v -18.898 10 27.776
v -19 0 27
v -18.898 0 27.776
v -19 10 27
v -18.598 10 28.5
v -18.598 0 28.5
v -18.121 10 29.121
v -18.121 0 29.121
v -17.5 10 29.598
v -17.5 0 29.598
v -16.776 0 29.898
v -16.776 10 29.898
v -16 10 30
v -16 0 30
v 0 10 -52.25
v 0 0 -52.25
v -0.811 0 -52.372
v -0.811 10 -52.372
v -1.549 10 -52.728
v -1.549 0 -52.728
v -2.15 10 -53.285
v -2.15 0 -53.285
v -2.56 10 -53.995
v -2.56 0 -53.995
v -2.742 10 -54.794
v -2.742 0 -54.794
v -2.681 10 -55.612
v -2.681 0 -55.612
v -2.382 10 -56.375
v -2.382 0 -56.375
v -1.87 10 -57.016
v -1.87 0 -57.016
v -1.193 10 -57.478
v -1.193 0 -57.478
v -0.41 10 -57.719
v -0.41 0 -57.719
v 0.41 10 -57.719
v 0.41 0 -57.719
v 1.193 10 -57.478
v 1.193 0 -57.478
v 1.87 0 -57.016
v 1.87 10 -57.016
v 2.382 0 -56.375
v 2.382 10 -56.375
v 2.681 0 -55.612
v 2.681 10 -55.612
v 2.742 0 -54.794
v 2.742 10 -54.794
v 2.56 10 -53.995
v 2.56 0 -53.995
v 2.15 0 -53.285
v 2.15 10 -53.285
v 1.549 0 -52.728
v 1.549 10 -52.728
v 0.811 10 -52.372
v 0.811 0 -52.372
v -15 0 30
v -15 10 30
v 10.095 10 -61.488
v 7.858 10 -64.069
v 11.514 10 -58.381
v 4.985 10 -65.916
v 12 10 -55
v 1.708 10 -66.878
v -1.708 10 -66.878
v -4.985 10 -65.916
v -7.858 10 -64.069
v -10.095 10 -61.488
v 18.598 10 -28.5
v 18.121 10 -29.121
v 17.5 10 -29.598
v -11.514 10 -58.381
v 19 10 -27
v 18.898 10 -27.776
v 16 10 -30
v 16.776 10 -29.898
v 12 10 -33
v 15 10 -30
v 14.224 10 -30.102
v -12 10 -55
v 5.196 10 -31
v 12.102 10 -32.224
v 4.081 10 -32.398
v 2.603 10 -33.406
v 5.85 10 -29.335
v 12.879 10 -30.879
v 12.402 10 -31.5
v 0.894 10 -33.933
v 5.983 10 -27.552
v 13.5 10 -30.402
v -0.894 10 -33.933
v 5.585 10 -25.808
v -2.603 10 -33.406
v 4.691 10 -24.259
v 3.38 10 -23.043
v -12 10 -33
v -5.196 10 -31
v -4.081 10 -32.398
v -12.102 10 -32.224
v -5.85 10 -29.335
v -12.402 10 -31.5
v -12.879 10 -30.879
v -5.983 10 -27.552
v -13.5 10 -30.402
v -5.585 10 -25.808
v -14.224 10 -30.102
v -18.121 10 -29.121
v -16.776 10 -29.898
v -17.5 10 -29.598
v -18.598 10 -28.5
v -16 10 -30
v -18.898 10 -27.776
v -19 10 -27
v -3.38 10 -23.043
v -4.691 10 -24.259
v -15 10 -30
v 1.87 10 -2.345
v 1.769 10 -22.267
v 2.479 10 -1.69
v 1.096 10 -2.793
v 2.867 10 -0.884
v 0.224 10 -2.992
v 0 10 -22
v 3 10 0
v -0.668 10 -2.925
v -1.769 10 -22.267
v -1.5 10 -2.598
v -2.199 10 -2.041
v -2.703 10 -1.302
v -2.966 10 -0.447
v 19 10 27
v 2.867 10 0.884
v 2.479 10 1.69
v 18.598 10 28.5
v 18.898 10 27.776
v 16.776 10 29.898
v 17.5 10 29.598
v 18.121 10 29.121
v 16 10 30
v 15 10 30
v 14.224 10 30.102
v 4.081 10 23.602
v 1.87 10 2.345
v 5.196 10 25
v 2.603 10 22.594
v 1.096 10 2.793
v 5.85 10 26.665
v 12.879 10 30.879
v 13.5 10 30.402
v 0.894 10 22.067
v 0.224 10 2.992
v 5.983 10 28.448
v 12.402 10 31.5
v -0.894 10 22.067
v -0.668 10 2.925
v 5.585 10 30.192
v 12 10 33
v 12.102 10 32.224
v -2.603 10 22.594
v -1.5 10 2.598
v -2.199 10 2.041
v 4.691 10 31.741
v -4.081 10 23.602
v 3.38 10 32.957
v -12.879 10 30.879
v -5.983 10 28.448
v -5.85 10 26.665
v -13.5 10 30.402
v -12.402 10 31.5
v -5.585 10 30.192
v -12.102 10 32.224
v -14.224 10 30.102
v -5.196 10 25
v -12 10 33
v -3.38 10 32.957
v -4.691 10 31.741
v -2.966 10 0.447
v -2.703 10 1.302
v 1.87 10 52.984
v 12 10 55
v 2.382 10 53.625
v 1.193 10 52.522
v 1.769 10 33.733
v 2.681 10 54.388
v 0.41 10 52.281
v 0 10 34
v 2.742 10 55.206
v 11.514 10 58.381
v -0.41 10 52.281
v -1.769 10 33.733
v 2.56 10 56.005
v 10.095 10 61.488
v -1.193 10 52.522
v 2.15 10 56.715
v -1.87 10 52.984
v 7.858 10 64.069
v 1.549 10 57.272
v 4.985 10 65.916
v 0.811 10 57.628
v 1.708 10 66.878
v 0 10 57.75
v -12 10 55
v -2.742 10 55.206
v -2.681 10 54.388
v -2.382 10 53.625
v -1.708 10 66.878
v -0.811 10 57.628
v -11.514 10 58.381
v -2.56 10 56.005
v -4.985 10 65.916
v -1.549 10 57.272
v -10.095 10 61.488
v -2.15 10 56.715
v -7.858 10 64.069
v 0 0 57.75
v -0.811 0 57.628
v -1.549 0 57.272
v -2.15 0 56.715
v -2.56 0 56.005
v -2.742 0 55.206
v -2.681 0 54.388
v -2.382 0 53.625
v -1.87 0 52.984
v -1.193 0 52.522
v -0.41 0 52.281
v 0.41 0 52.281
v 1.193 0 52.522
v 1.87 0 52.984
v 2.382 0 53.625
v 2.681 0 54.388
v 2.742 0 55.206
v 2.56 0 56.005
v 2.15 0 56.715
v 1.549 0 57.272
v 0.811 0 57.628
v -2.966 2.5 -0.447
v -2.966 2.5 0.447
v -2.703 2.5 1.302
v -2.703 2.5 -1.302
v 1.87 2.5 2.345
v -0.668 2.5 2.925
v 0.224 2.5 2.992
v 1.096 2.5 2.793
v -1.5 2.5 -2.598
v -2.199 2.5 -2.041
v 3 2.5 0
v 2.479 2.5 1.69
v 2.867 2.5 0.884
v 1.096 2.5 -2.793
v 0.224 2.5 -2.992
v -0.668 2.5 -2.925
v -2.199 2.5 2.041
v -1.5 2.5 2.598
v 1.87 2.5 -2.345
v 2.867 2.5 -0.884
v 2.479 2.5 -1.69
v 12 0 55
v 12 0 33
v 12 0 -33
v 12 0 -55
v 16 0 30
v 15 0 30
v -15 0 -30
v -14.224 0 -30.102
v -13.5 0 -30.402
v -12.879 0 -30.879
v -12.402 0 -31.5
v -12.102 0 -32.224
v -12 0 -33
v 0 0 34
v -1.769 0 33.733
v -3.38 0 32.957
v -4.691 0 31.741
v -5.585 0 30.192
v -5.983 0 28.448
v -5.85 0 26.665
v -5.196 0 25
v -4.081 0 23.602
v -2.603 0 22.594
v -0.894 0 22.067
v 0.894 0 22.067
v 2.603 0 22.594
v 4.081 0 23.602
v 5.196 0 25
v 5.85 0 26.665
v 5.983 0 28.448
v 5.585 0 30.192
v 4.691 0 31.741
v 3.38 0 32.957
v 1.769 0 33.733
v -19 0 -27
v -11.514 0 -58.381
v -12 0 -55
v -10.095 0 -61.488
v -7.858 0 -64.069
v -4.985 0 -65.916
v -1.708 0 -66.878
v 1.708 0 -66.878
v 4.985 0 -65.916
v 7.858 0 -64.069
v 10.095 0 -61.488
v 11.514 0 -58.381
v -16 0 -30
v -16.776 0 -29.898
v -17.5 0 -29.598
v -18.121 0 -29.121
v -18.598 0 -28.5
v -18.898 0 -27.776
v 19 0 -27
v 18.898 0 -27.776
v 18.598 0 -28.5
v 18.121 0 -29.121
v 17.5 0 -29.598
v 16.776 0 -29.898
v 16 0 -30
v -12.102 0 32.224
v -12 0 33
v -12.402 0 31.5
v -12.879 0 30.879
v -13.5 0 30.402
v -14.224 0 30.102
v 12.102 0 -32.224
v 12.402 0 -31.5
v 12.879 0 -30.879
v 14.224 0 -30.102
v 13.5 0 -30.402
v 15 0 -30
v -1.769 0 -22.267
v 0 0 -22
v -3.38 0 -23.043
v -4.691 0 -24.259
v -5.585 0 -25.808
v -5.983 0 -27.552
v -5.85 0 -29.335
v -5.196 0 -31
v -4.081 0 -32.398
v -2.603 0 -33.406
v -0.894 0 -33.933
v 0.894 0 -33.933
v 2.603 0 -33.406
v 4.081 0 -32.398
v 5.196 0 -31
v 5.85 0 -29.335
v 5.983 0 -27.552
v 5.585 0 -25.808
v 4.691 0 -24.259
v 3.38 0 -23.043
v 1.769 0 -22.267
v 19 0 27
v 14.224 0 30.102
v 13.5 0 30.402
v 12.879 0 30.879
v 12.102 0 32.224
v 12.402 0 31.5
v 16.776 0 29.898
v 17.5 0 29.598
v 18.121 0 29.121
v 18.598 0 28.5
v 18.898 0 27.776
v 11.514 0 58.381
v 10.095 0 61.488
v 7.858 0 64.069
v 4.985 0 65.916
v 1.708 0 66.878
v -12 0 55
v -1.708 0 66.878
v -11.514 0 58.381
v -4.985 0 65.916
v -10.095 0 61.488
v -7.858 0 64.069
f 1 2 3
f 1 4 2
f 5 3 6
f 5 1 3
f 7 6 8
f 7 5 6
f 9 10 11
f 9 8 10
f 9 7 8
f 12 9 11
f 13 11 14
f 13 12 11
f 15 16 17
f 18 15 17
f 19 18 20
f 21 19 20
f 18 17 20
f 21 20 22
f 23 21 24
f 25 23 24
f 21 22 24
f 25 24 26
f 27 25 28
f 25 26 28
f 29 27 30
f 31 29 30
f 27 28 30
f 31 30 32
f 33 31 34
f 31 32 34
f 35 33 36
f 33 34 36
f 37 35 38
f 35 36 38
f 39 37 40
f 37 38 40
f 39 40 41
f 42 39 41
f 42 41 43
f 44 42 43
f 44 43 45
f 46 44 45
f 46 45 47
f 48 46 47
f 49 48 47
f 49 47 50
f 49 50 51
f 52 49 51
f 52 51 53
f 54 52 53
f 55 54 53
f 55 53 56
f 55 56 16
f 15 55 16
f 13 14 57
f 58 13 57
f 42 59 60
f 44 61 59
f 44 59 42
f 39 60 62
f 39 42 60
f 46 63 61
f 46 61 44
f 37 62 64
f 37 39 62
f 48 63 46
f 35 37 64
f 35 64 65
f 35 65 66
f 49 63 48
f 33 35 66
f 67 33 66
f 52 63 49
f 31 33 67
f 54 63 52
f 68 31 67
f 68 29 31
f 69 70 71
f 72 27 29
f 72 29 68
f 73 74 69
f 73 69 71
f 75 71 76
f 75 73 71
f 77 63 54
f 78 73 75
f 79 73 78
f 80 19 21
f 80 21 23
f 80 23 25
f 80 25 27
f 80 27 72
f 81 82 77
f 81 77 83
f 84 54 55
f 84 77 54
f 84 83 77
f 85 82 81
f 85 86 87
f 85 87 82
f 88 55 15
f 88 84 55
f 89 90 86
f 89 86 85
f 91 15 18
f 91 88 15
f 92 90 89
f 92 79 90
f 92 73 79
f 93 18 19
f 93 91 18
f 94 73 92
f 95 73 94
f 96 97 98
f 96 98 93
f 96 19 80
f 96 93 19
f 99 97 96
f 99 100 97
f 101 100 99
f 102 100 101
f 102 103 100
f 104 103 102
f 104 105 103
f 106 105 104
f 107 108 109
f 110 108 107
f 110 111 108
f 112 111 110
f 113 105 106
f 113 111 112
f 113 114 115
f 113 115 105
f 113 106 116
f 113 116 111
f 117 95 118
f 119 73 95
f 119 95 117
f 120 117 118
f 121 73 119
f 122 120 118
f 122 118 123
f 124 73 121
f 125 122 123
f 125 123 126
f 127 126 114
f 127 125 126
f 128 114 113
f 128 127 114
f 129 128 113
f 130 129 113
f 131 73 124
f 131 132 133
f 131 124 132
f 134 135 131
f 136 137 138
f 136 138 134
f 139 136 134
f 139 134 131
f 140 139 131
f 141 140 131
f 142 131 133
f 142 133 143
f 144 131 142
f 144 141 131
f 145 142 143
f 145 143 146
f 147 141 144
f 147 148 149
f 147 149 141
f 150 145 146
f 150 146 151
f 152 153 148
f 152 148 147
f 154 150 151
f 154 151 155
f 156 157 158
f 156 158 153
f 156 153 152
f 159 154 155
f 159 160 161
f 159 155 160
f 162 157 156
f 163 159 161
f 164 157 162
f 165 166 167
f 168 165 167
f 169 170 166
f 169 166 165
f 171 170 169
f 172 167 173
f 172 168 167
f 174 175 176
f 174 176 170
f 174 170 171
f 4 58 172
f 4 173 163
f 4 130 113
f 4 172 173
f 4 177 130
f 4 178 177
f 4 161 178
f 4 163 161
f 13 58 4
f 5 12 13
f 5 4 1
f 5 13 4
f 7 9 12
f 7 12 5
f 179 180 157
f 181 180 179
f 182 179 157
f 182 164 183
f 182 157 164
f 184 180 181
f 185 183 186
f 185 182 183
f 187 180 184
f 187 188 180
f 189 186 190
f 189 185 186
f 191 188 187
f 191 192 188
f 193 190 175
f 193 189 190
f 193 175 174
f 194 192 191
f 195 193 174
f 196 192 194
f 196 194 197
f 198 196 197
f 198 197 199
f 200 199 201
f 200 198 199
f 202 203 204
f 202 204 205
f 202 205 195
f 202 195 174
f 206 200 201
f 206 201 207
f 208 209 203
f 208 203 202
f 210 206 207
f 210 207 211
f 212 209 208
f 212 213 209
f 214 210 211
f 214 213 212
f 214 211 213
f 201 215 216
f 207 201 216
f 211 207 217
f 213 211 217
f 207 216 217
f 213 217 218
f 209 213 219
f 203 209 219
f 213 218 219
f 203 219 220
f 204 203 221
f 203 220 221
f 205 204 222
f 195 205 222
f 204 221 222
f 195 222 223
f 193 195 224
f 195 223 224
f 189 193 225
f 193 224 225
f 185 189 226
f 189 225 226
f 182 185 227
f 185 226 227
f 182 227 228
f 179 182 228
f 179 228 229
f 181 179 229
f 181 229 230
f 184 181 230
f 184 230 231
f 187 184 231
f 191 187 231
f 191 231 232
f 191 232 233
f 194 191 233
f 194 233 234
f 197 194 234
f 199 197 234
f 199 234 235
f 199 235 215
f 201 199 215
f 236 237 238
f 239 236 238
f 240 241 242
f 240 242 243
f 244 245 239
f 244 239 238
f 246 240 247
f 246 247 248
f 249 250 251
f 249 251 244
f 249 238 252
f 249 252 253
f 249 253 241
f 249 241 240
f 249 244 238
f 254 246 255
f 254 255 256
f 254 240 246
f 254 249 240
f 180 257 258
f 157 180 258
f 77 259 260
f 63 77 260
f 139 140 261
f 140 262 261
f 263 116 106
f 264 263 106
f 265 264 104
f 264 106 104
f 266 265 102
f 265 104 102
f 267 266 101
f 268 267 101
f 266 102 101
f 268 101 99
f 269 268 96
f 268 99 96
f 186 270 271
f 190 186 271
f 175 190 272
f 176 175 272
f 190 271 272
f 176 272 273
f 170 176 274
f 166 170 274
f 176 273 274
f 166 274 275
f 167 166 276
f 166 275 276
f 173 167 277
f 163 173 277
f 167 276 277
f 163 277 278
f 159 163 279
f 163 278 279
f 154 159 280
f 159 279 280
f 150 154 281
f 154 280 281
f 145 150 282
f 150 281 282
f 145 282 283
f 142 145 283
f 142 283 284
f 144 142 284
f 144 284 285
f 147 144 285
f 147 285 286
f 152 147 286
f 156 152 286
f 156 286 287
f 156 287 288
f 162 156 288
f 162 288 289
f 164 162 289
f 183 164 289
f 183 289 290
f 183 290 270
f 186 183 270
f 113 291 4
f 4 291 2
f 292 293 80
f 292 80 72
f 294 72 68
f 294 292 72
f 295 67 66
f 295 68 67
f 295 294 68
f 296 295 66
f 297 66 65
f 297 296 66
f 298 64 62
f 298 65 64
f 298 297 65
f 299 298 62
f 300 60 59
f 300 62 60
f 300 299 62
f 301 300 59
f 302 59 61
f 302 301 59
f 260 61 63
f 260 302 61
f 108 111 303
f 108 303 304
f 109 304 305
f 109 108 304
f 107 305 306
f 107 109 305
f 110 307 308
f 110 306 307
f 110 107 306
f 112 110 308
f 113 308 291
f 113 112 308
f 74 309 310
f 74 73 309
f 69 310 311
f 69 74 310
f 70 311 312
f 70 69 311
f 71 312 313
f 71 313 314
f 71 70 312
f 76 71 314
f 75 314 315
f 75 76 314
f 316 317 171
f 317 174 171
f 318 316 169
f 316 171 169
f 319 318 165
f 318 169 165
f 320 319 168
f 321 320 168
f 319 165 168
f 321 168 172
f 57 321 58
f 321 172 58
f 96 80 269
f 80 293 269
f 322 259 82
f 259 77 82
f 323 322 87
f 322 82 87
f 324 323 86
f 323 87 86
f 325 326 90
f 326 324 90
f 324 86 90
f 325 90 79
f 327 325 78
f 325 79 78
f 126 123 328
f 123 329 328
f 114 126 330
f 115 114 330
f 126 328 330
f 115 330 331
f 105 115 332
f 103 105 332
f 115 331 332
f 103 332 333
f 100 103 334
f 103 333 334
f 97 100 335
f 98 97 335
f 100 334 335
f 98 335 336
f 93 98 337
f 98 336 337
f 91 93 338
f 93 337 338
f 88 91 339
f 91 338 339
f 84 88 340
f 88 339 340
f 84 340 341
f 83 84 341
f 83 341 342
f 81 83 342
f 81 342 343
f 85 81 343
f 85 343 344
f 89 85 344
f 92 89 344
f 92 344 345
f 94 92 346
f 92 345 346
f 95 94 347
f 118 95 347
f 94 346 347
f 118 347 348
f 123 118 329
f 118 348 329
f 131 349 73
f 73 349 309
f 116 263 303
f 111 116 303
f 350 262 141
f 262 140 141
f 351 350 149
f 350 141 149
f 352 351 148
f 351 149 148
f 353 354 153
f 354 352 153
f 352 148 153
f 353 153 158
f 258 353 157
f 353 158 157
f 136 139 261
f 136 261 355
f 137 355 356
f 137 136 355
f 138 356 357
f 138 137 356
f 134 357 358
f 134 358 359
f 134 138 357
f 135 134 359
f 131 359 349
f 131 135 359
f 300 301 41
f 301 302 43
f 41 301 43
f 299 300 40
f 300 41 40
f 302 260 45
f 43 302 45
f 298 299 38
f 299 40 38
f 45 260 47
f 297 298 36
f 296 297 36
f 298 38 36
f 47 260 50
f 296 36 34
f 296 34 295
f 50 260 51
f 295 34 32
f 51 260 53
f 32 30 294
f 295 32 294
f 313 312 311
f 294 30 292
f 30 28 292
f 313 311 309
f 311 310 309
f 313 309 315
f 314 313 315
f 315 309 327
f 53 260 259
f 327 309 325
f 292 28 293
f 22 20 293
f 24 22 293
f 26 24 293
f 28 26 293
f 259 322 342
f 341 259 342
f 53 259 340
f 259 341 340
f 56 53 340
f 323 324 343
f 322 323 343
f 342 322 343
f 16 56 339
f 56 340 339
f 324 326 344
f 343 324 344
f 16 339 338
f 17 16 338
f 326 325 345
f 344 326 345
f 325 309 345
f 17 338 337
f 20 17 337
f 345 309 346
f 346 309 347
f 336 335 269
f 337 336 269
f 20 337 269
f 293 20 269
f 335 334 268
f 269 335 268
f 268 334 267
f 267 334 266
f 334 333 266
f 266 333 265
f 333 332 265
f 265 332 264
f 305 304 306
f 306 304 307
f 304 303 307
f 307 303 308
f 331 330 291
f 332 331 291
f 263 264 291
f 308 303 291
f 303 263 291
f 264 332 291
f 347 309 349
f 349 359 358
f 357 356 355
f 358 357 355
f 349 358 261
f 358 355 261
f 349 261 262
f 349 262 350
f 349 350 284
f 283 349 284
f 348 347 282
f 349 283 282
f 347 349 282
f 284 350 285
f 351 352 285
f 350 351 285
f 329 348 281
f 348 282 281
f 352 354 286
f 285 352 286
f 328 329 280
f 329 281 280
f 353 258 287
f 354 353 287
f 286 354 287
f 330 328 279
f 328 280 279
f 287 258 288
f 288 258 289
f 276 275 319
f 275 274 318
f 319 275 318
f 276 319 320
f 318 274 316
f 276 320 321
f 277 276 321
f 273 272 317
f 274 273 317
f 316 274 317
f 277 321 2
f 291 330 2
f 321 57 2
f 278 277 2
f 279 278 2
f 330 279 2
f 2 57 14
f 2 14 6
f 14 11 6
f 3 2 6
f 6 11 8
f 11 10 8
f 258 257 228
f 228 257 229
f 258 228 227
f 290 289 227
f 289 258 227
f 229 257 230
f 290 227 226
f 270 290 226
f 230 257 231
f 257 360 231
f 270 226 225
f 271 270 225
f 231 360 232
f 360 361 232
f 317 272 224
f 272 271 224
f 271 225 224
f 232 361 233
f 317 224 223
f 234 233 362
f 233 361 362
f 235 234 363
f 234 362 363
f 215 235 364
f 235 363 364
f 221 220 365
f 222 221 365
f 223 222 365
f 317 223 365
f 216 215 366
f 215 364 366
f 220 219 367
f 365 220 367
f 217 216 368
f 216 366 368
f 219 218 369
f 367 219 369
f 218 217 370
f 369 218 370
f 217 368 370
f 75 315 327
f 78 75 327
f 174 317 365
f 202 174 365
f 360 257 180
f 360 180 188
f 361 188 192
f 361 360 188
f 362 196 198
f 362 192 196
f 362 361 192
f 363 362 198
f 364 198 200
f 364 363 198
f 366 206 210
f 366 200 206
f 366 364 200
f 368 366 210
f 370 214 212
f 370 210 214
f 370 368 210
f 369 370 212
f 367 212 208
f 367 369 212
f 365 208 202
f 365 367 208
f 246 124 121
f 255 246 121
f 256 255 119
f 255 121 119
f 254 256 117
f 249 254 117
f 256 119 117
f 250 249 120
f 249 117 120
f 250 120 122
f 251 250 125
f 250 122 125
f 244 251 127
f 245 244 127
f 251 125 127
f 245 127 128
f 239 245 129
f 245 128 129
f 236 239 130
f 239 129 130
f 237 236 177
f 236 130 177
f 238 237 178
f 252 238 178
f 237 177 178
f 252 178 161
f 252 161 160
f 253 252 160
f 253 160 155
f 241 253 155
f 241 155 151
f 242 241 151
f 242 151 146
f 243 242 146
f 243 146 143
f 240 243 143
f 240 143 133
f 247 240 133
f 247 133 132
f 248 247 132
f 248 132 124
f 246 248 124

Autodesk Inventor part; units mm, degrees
ref_plane "YZ Plane" through (0, 0, 0) normal (1, 0, 0) x (0, 1, 0)
ref_plane "XZ Plane" through (0, 0, 0) normal (0, 1, 0) x (-1, 0, 0)
ref_plane "XY Plane" through (0, 0, 0) normal (0, 0, 1) x (1, 0, 0)
sketch "Sketch1" plane through (0, 0, 0) normal (0, 1, 0) x (-1, 0, 0)
  line L0 (0, 55) -> (0, -55) construction
  line L1 (-12, 55) -> (-12, -55)
  line L2 (12, -55) -> (12, 55)
  arc A0 (12, 55) -> (-12, 55) centre (0, 55) ccw
  arc A1 (-12, -55) -> (12, -55) centre (0, -55) ccw
  line L3 (-19, 30) -> (-19, -30)
  line L4 (-19, -30) -> (19, -30)
  line L5 (19, -30) -> (19, 30)
  line L6 (19, 30) -> (-19, 30)
  line L7 (-19, 30) -> (19, -30) construction
  line L8 (-19, -30) -> (19, 30) construction
  point P0 (0, 0)
  point P1 (-12, 30)
  point P2 (-12, -30)
  point P3 (12, -30)
  point P4 (12, 30)
  dimension "d0" = 60
  dimension "d1" = 110
  dimension "d2" = 12
  dimension "d3" = 38
extrude "Extrusion1" add sketch "Sketch1" along normal blind 10
sketch "Sketch2" plane through (0, 10, 0) normal (0, 1, 0) x (1, 0, 0)
  line L0 (19, -30) -> (19, 30) projected
  line L1 (19, 30) -> (12, 30) projected
  line L2 (12, 30) -> (12, 55) projected
  arc A0 (12, 55) -> (-12, 55) centre (0, 55) ccw projected
  line L3 (-12, 55) -> (-12, 30) projected
  line L4 (-12, 30) -> (-19, 30) projected
  line L5 (-19, 30) -> (-19, -30) projected
  line L6 (-19, -30) -> (-12, -30) projected
  line L7 (-12, -30) -> (-12, -55) projected
  arc A1 (-12, -55) -> (12, -55) centre (0, -55) ccw projected
  line L8 (12, -55) -> (12, -30) projected
  line L9 (12, -30) -> (19, -30) projected
  line L10 (0, -28) -> (0, 28)
  line L11 (0, 0) -> (-19, 0)
  line L12 (-19, 30) -> (-19, -30) projected
  dimension "d6" = 56
hole "Hole1" at (0, 10, 28) at (0, 10, -28) direction (0, -1, 0) diameter 12 end through all
fillet "Fillet1" radius 3 8 edges at (19, 5, 30) (19, 5, -30) (12, 5, 30) (-19, 5, 30) (-12, 5, 30) (-19, 5, -30) (-12, 5, -30) (12, 5, -30)
sketch "Sketch3" plane through (0, 10, 0) normal (0, 1, 0) x (1, 0, 0)
  arc A0 (-12, -55) -> (12, -55) centre (0, -55) ccw projected
  arc A1 (12, 55) -> (-12, 55) centre (0, 55) ccw projected
  point P0 (0, 0)
hole "Hole2" at (0, 10, 55) at (0, 10, -55) direction (0, -1, 0) diameter 5.5 end through all
sketch "Sketch4" plane through (0, 10, 0) normal (0, 1, 0) x (1, 0, 0)
  circle A0 centre (0, 0) radius 3
  dimension "d22" = 6
extrude "Extrusion2" cut sketch "Sketch4" against normal blind 7.5
properties part number "04_Mieng_go_dem_lo_xo" material "Stainless Steel, Austenitic"
